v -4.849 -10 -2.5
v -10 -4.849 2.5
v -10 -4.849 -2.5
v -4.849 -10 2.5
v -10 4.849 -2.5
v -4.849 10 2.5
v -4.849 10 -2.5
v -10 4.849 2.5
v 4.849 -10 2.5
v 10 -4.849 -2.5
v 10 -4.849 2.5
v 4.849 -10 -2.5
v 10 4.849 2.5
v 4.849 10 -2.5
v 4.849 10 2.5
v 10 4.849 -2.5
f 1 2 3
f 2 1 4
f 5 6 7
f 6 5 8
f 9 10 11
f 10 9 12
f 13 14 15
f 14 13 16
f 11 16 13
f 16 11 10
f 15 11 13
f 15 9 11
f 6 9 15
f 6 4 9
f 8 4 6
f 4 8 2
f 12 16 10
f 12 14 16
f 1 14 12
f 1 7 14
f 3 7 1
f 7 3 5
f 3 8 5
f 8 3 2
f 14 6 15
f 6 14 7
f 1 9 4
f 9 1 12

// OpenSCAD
module edges(){
color("red")
difference(){
cube([ 21,21,7], center = true);
    rotate( [0,0,45])
        cube([ 21,21,7], center = true);
}
}

difference(){
    cube([ 20,20,5], center = true);
    edges();
}
